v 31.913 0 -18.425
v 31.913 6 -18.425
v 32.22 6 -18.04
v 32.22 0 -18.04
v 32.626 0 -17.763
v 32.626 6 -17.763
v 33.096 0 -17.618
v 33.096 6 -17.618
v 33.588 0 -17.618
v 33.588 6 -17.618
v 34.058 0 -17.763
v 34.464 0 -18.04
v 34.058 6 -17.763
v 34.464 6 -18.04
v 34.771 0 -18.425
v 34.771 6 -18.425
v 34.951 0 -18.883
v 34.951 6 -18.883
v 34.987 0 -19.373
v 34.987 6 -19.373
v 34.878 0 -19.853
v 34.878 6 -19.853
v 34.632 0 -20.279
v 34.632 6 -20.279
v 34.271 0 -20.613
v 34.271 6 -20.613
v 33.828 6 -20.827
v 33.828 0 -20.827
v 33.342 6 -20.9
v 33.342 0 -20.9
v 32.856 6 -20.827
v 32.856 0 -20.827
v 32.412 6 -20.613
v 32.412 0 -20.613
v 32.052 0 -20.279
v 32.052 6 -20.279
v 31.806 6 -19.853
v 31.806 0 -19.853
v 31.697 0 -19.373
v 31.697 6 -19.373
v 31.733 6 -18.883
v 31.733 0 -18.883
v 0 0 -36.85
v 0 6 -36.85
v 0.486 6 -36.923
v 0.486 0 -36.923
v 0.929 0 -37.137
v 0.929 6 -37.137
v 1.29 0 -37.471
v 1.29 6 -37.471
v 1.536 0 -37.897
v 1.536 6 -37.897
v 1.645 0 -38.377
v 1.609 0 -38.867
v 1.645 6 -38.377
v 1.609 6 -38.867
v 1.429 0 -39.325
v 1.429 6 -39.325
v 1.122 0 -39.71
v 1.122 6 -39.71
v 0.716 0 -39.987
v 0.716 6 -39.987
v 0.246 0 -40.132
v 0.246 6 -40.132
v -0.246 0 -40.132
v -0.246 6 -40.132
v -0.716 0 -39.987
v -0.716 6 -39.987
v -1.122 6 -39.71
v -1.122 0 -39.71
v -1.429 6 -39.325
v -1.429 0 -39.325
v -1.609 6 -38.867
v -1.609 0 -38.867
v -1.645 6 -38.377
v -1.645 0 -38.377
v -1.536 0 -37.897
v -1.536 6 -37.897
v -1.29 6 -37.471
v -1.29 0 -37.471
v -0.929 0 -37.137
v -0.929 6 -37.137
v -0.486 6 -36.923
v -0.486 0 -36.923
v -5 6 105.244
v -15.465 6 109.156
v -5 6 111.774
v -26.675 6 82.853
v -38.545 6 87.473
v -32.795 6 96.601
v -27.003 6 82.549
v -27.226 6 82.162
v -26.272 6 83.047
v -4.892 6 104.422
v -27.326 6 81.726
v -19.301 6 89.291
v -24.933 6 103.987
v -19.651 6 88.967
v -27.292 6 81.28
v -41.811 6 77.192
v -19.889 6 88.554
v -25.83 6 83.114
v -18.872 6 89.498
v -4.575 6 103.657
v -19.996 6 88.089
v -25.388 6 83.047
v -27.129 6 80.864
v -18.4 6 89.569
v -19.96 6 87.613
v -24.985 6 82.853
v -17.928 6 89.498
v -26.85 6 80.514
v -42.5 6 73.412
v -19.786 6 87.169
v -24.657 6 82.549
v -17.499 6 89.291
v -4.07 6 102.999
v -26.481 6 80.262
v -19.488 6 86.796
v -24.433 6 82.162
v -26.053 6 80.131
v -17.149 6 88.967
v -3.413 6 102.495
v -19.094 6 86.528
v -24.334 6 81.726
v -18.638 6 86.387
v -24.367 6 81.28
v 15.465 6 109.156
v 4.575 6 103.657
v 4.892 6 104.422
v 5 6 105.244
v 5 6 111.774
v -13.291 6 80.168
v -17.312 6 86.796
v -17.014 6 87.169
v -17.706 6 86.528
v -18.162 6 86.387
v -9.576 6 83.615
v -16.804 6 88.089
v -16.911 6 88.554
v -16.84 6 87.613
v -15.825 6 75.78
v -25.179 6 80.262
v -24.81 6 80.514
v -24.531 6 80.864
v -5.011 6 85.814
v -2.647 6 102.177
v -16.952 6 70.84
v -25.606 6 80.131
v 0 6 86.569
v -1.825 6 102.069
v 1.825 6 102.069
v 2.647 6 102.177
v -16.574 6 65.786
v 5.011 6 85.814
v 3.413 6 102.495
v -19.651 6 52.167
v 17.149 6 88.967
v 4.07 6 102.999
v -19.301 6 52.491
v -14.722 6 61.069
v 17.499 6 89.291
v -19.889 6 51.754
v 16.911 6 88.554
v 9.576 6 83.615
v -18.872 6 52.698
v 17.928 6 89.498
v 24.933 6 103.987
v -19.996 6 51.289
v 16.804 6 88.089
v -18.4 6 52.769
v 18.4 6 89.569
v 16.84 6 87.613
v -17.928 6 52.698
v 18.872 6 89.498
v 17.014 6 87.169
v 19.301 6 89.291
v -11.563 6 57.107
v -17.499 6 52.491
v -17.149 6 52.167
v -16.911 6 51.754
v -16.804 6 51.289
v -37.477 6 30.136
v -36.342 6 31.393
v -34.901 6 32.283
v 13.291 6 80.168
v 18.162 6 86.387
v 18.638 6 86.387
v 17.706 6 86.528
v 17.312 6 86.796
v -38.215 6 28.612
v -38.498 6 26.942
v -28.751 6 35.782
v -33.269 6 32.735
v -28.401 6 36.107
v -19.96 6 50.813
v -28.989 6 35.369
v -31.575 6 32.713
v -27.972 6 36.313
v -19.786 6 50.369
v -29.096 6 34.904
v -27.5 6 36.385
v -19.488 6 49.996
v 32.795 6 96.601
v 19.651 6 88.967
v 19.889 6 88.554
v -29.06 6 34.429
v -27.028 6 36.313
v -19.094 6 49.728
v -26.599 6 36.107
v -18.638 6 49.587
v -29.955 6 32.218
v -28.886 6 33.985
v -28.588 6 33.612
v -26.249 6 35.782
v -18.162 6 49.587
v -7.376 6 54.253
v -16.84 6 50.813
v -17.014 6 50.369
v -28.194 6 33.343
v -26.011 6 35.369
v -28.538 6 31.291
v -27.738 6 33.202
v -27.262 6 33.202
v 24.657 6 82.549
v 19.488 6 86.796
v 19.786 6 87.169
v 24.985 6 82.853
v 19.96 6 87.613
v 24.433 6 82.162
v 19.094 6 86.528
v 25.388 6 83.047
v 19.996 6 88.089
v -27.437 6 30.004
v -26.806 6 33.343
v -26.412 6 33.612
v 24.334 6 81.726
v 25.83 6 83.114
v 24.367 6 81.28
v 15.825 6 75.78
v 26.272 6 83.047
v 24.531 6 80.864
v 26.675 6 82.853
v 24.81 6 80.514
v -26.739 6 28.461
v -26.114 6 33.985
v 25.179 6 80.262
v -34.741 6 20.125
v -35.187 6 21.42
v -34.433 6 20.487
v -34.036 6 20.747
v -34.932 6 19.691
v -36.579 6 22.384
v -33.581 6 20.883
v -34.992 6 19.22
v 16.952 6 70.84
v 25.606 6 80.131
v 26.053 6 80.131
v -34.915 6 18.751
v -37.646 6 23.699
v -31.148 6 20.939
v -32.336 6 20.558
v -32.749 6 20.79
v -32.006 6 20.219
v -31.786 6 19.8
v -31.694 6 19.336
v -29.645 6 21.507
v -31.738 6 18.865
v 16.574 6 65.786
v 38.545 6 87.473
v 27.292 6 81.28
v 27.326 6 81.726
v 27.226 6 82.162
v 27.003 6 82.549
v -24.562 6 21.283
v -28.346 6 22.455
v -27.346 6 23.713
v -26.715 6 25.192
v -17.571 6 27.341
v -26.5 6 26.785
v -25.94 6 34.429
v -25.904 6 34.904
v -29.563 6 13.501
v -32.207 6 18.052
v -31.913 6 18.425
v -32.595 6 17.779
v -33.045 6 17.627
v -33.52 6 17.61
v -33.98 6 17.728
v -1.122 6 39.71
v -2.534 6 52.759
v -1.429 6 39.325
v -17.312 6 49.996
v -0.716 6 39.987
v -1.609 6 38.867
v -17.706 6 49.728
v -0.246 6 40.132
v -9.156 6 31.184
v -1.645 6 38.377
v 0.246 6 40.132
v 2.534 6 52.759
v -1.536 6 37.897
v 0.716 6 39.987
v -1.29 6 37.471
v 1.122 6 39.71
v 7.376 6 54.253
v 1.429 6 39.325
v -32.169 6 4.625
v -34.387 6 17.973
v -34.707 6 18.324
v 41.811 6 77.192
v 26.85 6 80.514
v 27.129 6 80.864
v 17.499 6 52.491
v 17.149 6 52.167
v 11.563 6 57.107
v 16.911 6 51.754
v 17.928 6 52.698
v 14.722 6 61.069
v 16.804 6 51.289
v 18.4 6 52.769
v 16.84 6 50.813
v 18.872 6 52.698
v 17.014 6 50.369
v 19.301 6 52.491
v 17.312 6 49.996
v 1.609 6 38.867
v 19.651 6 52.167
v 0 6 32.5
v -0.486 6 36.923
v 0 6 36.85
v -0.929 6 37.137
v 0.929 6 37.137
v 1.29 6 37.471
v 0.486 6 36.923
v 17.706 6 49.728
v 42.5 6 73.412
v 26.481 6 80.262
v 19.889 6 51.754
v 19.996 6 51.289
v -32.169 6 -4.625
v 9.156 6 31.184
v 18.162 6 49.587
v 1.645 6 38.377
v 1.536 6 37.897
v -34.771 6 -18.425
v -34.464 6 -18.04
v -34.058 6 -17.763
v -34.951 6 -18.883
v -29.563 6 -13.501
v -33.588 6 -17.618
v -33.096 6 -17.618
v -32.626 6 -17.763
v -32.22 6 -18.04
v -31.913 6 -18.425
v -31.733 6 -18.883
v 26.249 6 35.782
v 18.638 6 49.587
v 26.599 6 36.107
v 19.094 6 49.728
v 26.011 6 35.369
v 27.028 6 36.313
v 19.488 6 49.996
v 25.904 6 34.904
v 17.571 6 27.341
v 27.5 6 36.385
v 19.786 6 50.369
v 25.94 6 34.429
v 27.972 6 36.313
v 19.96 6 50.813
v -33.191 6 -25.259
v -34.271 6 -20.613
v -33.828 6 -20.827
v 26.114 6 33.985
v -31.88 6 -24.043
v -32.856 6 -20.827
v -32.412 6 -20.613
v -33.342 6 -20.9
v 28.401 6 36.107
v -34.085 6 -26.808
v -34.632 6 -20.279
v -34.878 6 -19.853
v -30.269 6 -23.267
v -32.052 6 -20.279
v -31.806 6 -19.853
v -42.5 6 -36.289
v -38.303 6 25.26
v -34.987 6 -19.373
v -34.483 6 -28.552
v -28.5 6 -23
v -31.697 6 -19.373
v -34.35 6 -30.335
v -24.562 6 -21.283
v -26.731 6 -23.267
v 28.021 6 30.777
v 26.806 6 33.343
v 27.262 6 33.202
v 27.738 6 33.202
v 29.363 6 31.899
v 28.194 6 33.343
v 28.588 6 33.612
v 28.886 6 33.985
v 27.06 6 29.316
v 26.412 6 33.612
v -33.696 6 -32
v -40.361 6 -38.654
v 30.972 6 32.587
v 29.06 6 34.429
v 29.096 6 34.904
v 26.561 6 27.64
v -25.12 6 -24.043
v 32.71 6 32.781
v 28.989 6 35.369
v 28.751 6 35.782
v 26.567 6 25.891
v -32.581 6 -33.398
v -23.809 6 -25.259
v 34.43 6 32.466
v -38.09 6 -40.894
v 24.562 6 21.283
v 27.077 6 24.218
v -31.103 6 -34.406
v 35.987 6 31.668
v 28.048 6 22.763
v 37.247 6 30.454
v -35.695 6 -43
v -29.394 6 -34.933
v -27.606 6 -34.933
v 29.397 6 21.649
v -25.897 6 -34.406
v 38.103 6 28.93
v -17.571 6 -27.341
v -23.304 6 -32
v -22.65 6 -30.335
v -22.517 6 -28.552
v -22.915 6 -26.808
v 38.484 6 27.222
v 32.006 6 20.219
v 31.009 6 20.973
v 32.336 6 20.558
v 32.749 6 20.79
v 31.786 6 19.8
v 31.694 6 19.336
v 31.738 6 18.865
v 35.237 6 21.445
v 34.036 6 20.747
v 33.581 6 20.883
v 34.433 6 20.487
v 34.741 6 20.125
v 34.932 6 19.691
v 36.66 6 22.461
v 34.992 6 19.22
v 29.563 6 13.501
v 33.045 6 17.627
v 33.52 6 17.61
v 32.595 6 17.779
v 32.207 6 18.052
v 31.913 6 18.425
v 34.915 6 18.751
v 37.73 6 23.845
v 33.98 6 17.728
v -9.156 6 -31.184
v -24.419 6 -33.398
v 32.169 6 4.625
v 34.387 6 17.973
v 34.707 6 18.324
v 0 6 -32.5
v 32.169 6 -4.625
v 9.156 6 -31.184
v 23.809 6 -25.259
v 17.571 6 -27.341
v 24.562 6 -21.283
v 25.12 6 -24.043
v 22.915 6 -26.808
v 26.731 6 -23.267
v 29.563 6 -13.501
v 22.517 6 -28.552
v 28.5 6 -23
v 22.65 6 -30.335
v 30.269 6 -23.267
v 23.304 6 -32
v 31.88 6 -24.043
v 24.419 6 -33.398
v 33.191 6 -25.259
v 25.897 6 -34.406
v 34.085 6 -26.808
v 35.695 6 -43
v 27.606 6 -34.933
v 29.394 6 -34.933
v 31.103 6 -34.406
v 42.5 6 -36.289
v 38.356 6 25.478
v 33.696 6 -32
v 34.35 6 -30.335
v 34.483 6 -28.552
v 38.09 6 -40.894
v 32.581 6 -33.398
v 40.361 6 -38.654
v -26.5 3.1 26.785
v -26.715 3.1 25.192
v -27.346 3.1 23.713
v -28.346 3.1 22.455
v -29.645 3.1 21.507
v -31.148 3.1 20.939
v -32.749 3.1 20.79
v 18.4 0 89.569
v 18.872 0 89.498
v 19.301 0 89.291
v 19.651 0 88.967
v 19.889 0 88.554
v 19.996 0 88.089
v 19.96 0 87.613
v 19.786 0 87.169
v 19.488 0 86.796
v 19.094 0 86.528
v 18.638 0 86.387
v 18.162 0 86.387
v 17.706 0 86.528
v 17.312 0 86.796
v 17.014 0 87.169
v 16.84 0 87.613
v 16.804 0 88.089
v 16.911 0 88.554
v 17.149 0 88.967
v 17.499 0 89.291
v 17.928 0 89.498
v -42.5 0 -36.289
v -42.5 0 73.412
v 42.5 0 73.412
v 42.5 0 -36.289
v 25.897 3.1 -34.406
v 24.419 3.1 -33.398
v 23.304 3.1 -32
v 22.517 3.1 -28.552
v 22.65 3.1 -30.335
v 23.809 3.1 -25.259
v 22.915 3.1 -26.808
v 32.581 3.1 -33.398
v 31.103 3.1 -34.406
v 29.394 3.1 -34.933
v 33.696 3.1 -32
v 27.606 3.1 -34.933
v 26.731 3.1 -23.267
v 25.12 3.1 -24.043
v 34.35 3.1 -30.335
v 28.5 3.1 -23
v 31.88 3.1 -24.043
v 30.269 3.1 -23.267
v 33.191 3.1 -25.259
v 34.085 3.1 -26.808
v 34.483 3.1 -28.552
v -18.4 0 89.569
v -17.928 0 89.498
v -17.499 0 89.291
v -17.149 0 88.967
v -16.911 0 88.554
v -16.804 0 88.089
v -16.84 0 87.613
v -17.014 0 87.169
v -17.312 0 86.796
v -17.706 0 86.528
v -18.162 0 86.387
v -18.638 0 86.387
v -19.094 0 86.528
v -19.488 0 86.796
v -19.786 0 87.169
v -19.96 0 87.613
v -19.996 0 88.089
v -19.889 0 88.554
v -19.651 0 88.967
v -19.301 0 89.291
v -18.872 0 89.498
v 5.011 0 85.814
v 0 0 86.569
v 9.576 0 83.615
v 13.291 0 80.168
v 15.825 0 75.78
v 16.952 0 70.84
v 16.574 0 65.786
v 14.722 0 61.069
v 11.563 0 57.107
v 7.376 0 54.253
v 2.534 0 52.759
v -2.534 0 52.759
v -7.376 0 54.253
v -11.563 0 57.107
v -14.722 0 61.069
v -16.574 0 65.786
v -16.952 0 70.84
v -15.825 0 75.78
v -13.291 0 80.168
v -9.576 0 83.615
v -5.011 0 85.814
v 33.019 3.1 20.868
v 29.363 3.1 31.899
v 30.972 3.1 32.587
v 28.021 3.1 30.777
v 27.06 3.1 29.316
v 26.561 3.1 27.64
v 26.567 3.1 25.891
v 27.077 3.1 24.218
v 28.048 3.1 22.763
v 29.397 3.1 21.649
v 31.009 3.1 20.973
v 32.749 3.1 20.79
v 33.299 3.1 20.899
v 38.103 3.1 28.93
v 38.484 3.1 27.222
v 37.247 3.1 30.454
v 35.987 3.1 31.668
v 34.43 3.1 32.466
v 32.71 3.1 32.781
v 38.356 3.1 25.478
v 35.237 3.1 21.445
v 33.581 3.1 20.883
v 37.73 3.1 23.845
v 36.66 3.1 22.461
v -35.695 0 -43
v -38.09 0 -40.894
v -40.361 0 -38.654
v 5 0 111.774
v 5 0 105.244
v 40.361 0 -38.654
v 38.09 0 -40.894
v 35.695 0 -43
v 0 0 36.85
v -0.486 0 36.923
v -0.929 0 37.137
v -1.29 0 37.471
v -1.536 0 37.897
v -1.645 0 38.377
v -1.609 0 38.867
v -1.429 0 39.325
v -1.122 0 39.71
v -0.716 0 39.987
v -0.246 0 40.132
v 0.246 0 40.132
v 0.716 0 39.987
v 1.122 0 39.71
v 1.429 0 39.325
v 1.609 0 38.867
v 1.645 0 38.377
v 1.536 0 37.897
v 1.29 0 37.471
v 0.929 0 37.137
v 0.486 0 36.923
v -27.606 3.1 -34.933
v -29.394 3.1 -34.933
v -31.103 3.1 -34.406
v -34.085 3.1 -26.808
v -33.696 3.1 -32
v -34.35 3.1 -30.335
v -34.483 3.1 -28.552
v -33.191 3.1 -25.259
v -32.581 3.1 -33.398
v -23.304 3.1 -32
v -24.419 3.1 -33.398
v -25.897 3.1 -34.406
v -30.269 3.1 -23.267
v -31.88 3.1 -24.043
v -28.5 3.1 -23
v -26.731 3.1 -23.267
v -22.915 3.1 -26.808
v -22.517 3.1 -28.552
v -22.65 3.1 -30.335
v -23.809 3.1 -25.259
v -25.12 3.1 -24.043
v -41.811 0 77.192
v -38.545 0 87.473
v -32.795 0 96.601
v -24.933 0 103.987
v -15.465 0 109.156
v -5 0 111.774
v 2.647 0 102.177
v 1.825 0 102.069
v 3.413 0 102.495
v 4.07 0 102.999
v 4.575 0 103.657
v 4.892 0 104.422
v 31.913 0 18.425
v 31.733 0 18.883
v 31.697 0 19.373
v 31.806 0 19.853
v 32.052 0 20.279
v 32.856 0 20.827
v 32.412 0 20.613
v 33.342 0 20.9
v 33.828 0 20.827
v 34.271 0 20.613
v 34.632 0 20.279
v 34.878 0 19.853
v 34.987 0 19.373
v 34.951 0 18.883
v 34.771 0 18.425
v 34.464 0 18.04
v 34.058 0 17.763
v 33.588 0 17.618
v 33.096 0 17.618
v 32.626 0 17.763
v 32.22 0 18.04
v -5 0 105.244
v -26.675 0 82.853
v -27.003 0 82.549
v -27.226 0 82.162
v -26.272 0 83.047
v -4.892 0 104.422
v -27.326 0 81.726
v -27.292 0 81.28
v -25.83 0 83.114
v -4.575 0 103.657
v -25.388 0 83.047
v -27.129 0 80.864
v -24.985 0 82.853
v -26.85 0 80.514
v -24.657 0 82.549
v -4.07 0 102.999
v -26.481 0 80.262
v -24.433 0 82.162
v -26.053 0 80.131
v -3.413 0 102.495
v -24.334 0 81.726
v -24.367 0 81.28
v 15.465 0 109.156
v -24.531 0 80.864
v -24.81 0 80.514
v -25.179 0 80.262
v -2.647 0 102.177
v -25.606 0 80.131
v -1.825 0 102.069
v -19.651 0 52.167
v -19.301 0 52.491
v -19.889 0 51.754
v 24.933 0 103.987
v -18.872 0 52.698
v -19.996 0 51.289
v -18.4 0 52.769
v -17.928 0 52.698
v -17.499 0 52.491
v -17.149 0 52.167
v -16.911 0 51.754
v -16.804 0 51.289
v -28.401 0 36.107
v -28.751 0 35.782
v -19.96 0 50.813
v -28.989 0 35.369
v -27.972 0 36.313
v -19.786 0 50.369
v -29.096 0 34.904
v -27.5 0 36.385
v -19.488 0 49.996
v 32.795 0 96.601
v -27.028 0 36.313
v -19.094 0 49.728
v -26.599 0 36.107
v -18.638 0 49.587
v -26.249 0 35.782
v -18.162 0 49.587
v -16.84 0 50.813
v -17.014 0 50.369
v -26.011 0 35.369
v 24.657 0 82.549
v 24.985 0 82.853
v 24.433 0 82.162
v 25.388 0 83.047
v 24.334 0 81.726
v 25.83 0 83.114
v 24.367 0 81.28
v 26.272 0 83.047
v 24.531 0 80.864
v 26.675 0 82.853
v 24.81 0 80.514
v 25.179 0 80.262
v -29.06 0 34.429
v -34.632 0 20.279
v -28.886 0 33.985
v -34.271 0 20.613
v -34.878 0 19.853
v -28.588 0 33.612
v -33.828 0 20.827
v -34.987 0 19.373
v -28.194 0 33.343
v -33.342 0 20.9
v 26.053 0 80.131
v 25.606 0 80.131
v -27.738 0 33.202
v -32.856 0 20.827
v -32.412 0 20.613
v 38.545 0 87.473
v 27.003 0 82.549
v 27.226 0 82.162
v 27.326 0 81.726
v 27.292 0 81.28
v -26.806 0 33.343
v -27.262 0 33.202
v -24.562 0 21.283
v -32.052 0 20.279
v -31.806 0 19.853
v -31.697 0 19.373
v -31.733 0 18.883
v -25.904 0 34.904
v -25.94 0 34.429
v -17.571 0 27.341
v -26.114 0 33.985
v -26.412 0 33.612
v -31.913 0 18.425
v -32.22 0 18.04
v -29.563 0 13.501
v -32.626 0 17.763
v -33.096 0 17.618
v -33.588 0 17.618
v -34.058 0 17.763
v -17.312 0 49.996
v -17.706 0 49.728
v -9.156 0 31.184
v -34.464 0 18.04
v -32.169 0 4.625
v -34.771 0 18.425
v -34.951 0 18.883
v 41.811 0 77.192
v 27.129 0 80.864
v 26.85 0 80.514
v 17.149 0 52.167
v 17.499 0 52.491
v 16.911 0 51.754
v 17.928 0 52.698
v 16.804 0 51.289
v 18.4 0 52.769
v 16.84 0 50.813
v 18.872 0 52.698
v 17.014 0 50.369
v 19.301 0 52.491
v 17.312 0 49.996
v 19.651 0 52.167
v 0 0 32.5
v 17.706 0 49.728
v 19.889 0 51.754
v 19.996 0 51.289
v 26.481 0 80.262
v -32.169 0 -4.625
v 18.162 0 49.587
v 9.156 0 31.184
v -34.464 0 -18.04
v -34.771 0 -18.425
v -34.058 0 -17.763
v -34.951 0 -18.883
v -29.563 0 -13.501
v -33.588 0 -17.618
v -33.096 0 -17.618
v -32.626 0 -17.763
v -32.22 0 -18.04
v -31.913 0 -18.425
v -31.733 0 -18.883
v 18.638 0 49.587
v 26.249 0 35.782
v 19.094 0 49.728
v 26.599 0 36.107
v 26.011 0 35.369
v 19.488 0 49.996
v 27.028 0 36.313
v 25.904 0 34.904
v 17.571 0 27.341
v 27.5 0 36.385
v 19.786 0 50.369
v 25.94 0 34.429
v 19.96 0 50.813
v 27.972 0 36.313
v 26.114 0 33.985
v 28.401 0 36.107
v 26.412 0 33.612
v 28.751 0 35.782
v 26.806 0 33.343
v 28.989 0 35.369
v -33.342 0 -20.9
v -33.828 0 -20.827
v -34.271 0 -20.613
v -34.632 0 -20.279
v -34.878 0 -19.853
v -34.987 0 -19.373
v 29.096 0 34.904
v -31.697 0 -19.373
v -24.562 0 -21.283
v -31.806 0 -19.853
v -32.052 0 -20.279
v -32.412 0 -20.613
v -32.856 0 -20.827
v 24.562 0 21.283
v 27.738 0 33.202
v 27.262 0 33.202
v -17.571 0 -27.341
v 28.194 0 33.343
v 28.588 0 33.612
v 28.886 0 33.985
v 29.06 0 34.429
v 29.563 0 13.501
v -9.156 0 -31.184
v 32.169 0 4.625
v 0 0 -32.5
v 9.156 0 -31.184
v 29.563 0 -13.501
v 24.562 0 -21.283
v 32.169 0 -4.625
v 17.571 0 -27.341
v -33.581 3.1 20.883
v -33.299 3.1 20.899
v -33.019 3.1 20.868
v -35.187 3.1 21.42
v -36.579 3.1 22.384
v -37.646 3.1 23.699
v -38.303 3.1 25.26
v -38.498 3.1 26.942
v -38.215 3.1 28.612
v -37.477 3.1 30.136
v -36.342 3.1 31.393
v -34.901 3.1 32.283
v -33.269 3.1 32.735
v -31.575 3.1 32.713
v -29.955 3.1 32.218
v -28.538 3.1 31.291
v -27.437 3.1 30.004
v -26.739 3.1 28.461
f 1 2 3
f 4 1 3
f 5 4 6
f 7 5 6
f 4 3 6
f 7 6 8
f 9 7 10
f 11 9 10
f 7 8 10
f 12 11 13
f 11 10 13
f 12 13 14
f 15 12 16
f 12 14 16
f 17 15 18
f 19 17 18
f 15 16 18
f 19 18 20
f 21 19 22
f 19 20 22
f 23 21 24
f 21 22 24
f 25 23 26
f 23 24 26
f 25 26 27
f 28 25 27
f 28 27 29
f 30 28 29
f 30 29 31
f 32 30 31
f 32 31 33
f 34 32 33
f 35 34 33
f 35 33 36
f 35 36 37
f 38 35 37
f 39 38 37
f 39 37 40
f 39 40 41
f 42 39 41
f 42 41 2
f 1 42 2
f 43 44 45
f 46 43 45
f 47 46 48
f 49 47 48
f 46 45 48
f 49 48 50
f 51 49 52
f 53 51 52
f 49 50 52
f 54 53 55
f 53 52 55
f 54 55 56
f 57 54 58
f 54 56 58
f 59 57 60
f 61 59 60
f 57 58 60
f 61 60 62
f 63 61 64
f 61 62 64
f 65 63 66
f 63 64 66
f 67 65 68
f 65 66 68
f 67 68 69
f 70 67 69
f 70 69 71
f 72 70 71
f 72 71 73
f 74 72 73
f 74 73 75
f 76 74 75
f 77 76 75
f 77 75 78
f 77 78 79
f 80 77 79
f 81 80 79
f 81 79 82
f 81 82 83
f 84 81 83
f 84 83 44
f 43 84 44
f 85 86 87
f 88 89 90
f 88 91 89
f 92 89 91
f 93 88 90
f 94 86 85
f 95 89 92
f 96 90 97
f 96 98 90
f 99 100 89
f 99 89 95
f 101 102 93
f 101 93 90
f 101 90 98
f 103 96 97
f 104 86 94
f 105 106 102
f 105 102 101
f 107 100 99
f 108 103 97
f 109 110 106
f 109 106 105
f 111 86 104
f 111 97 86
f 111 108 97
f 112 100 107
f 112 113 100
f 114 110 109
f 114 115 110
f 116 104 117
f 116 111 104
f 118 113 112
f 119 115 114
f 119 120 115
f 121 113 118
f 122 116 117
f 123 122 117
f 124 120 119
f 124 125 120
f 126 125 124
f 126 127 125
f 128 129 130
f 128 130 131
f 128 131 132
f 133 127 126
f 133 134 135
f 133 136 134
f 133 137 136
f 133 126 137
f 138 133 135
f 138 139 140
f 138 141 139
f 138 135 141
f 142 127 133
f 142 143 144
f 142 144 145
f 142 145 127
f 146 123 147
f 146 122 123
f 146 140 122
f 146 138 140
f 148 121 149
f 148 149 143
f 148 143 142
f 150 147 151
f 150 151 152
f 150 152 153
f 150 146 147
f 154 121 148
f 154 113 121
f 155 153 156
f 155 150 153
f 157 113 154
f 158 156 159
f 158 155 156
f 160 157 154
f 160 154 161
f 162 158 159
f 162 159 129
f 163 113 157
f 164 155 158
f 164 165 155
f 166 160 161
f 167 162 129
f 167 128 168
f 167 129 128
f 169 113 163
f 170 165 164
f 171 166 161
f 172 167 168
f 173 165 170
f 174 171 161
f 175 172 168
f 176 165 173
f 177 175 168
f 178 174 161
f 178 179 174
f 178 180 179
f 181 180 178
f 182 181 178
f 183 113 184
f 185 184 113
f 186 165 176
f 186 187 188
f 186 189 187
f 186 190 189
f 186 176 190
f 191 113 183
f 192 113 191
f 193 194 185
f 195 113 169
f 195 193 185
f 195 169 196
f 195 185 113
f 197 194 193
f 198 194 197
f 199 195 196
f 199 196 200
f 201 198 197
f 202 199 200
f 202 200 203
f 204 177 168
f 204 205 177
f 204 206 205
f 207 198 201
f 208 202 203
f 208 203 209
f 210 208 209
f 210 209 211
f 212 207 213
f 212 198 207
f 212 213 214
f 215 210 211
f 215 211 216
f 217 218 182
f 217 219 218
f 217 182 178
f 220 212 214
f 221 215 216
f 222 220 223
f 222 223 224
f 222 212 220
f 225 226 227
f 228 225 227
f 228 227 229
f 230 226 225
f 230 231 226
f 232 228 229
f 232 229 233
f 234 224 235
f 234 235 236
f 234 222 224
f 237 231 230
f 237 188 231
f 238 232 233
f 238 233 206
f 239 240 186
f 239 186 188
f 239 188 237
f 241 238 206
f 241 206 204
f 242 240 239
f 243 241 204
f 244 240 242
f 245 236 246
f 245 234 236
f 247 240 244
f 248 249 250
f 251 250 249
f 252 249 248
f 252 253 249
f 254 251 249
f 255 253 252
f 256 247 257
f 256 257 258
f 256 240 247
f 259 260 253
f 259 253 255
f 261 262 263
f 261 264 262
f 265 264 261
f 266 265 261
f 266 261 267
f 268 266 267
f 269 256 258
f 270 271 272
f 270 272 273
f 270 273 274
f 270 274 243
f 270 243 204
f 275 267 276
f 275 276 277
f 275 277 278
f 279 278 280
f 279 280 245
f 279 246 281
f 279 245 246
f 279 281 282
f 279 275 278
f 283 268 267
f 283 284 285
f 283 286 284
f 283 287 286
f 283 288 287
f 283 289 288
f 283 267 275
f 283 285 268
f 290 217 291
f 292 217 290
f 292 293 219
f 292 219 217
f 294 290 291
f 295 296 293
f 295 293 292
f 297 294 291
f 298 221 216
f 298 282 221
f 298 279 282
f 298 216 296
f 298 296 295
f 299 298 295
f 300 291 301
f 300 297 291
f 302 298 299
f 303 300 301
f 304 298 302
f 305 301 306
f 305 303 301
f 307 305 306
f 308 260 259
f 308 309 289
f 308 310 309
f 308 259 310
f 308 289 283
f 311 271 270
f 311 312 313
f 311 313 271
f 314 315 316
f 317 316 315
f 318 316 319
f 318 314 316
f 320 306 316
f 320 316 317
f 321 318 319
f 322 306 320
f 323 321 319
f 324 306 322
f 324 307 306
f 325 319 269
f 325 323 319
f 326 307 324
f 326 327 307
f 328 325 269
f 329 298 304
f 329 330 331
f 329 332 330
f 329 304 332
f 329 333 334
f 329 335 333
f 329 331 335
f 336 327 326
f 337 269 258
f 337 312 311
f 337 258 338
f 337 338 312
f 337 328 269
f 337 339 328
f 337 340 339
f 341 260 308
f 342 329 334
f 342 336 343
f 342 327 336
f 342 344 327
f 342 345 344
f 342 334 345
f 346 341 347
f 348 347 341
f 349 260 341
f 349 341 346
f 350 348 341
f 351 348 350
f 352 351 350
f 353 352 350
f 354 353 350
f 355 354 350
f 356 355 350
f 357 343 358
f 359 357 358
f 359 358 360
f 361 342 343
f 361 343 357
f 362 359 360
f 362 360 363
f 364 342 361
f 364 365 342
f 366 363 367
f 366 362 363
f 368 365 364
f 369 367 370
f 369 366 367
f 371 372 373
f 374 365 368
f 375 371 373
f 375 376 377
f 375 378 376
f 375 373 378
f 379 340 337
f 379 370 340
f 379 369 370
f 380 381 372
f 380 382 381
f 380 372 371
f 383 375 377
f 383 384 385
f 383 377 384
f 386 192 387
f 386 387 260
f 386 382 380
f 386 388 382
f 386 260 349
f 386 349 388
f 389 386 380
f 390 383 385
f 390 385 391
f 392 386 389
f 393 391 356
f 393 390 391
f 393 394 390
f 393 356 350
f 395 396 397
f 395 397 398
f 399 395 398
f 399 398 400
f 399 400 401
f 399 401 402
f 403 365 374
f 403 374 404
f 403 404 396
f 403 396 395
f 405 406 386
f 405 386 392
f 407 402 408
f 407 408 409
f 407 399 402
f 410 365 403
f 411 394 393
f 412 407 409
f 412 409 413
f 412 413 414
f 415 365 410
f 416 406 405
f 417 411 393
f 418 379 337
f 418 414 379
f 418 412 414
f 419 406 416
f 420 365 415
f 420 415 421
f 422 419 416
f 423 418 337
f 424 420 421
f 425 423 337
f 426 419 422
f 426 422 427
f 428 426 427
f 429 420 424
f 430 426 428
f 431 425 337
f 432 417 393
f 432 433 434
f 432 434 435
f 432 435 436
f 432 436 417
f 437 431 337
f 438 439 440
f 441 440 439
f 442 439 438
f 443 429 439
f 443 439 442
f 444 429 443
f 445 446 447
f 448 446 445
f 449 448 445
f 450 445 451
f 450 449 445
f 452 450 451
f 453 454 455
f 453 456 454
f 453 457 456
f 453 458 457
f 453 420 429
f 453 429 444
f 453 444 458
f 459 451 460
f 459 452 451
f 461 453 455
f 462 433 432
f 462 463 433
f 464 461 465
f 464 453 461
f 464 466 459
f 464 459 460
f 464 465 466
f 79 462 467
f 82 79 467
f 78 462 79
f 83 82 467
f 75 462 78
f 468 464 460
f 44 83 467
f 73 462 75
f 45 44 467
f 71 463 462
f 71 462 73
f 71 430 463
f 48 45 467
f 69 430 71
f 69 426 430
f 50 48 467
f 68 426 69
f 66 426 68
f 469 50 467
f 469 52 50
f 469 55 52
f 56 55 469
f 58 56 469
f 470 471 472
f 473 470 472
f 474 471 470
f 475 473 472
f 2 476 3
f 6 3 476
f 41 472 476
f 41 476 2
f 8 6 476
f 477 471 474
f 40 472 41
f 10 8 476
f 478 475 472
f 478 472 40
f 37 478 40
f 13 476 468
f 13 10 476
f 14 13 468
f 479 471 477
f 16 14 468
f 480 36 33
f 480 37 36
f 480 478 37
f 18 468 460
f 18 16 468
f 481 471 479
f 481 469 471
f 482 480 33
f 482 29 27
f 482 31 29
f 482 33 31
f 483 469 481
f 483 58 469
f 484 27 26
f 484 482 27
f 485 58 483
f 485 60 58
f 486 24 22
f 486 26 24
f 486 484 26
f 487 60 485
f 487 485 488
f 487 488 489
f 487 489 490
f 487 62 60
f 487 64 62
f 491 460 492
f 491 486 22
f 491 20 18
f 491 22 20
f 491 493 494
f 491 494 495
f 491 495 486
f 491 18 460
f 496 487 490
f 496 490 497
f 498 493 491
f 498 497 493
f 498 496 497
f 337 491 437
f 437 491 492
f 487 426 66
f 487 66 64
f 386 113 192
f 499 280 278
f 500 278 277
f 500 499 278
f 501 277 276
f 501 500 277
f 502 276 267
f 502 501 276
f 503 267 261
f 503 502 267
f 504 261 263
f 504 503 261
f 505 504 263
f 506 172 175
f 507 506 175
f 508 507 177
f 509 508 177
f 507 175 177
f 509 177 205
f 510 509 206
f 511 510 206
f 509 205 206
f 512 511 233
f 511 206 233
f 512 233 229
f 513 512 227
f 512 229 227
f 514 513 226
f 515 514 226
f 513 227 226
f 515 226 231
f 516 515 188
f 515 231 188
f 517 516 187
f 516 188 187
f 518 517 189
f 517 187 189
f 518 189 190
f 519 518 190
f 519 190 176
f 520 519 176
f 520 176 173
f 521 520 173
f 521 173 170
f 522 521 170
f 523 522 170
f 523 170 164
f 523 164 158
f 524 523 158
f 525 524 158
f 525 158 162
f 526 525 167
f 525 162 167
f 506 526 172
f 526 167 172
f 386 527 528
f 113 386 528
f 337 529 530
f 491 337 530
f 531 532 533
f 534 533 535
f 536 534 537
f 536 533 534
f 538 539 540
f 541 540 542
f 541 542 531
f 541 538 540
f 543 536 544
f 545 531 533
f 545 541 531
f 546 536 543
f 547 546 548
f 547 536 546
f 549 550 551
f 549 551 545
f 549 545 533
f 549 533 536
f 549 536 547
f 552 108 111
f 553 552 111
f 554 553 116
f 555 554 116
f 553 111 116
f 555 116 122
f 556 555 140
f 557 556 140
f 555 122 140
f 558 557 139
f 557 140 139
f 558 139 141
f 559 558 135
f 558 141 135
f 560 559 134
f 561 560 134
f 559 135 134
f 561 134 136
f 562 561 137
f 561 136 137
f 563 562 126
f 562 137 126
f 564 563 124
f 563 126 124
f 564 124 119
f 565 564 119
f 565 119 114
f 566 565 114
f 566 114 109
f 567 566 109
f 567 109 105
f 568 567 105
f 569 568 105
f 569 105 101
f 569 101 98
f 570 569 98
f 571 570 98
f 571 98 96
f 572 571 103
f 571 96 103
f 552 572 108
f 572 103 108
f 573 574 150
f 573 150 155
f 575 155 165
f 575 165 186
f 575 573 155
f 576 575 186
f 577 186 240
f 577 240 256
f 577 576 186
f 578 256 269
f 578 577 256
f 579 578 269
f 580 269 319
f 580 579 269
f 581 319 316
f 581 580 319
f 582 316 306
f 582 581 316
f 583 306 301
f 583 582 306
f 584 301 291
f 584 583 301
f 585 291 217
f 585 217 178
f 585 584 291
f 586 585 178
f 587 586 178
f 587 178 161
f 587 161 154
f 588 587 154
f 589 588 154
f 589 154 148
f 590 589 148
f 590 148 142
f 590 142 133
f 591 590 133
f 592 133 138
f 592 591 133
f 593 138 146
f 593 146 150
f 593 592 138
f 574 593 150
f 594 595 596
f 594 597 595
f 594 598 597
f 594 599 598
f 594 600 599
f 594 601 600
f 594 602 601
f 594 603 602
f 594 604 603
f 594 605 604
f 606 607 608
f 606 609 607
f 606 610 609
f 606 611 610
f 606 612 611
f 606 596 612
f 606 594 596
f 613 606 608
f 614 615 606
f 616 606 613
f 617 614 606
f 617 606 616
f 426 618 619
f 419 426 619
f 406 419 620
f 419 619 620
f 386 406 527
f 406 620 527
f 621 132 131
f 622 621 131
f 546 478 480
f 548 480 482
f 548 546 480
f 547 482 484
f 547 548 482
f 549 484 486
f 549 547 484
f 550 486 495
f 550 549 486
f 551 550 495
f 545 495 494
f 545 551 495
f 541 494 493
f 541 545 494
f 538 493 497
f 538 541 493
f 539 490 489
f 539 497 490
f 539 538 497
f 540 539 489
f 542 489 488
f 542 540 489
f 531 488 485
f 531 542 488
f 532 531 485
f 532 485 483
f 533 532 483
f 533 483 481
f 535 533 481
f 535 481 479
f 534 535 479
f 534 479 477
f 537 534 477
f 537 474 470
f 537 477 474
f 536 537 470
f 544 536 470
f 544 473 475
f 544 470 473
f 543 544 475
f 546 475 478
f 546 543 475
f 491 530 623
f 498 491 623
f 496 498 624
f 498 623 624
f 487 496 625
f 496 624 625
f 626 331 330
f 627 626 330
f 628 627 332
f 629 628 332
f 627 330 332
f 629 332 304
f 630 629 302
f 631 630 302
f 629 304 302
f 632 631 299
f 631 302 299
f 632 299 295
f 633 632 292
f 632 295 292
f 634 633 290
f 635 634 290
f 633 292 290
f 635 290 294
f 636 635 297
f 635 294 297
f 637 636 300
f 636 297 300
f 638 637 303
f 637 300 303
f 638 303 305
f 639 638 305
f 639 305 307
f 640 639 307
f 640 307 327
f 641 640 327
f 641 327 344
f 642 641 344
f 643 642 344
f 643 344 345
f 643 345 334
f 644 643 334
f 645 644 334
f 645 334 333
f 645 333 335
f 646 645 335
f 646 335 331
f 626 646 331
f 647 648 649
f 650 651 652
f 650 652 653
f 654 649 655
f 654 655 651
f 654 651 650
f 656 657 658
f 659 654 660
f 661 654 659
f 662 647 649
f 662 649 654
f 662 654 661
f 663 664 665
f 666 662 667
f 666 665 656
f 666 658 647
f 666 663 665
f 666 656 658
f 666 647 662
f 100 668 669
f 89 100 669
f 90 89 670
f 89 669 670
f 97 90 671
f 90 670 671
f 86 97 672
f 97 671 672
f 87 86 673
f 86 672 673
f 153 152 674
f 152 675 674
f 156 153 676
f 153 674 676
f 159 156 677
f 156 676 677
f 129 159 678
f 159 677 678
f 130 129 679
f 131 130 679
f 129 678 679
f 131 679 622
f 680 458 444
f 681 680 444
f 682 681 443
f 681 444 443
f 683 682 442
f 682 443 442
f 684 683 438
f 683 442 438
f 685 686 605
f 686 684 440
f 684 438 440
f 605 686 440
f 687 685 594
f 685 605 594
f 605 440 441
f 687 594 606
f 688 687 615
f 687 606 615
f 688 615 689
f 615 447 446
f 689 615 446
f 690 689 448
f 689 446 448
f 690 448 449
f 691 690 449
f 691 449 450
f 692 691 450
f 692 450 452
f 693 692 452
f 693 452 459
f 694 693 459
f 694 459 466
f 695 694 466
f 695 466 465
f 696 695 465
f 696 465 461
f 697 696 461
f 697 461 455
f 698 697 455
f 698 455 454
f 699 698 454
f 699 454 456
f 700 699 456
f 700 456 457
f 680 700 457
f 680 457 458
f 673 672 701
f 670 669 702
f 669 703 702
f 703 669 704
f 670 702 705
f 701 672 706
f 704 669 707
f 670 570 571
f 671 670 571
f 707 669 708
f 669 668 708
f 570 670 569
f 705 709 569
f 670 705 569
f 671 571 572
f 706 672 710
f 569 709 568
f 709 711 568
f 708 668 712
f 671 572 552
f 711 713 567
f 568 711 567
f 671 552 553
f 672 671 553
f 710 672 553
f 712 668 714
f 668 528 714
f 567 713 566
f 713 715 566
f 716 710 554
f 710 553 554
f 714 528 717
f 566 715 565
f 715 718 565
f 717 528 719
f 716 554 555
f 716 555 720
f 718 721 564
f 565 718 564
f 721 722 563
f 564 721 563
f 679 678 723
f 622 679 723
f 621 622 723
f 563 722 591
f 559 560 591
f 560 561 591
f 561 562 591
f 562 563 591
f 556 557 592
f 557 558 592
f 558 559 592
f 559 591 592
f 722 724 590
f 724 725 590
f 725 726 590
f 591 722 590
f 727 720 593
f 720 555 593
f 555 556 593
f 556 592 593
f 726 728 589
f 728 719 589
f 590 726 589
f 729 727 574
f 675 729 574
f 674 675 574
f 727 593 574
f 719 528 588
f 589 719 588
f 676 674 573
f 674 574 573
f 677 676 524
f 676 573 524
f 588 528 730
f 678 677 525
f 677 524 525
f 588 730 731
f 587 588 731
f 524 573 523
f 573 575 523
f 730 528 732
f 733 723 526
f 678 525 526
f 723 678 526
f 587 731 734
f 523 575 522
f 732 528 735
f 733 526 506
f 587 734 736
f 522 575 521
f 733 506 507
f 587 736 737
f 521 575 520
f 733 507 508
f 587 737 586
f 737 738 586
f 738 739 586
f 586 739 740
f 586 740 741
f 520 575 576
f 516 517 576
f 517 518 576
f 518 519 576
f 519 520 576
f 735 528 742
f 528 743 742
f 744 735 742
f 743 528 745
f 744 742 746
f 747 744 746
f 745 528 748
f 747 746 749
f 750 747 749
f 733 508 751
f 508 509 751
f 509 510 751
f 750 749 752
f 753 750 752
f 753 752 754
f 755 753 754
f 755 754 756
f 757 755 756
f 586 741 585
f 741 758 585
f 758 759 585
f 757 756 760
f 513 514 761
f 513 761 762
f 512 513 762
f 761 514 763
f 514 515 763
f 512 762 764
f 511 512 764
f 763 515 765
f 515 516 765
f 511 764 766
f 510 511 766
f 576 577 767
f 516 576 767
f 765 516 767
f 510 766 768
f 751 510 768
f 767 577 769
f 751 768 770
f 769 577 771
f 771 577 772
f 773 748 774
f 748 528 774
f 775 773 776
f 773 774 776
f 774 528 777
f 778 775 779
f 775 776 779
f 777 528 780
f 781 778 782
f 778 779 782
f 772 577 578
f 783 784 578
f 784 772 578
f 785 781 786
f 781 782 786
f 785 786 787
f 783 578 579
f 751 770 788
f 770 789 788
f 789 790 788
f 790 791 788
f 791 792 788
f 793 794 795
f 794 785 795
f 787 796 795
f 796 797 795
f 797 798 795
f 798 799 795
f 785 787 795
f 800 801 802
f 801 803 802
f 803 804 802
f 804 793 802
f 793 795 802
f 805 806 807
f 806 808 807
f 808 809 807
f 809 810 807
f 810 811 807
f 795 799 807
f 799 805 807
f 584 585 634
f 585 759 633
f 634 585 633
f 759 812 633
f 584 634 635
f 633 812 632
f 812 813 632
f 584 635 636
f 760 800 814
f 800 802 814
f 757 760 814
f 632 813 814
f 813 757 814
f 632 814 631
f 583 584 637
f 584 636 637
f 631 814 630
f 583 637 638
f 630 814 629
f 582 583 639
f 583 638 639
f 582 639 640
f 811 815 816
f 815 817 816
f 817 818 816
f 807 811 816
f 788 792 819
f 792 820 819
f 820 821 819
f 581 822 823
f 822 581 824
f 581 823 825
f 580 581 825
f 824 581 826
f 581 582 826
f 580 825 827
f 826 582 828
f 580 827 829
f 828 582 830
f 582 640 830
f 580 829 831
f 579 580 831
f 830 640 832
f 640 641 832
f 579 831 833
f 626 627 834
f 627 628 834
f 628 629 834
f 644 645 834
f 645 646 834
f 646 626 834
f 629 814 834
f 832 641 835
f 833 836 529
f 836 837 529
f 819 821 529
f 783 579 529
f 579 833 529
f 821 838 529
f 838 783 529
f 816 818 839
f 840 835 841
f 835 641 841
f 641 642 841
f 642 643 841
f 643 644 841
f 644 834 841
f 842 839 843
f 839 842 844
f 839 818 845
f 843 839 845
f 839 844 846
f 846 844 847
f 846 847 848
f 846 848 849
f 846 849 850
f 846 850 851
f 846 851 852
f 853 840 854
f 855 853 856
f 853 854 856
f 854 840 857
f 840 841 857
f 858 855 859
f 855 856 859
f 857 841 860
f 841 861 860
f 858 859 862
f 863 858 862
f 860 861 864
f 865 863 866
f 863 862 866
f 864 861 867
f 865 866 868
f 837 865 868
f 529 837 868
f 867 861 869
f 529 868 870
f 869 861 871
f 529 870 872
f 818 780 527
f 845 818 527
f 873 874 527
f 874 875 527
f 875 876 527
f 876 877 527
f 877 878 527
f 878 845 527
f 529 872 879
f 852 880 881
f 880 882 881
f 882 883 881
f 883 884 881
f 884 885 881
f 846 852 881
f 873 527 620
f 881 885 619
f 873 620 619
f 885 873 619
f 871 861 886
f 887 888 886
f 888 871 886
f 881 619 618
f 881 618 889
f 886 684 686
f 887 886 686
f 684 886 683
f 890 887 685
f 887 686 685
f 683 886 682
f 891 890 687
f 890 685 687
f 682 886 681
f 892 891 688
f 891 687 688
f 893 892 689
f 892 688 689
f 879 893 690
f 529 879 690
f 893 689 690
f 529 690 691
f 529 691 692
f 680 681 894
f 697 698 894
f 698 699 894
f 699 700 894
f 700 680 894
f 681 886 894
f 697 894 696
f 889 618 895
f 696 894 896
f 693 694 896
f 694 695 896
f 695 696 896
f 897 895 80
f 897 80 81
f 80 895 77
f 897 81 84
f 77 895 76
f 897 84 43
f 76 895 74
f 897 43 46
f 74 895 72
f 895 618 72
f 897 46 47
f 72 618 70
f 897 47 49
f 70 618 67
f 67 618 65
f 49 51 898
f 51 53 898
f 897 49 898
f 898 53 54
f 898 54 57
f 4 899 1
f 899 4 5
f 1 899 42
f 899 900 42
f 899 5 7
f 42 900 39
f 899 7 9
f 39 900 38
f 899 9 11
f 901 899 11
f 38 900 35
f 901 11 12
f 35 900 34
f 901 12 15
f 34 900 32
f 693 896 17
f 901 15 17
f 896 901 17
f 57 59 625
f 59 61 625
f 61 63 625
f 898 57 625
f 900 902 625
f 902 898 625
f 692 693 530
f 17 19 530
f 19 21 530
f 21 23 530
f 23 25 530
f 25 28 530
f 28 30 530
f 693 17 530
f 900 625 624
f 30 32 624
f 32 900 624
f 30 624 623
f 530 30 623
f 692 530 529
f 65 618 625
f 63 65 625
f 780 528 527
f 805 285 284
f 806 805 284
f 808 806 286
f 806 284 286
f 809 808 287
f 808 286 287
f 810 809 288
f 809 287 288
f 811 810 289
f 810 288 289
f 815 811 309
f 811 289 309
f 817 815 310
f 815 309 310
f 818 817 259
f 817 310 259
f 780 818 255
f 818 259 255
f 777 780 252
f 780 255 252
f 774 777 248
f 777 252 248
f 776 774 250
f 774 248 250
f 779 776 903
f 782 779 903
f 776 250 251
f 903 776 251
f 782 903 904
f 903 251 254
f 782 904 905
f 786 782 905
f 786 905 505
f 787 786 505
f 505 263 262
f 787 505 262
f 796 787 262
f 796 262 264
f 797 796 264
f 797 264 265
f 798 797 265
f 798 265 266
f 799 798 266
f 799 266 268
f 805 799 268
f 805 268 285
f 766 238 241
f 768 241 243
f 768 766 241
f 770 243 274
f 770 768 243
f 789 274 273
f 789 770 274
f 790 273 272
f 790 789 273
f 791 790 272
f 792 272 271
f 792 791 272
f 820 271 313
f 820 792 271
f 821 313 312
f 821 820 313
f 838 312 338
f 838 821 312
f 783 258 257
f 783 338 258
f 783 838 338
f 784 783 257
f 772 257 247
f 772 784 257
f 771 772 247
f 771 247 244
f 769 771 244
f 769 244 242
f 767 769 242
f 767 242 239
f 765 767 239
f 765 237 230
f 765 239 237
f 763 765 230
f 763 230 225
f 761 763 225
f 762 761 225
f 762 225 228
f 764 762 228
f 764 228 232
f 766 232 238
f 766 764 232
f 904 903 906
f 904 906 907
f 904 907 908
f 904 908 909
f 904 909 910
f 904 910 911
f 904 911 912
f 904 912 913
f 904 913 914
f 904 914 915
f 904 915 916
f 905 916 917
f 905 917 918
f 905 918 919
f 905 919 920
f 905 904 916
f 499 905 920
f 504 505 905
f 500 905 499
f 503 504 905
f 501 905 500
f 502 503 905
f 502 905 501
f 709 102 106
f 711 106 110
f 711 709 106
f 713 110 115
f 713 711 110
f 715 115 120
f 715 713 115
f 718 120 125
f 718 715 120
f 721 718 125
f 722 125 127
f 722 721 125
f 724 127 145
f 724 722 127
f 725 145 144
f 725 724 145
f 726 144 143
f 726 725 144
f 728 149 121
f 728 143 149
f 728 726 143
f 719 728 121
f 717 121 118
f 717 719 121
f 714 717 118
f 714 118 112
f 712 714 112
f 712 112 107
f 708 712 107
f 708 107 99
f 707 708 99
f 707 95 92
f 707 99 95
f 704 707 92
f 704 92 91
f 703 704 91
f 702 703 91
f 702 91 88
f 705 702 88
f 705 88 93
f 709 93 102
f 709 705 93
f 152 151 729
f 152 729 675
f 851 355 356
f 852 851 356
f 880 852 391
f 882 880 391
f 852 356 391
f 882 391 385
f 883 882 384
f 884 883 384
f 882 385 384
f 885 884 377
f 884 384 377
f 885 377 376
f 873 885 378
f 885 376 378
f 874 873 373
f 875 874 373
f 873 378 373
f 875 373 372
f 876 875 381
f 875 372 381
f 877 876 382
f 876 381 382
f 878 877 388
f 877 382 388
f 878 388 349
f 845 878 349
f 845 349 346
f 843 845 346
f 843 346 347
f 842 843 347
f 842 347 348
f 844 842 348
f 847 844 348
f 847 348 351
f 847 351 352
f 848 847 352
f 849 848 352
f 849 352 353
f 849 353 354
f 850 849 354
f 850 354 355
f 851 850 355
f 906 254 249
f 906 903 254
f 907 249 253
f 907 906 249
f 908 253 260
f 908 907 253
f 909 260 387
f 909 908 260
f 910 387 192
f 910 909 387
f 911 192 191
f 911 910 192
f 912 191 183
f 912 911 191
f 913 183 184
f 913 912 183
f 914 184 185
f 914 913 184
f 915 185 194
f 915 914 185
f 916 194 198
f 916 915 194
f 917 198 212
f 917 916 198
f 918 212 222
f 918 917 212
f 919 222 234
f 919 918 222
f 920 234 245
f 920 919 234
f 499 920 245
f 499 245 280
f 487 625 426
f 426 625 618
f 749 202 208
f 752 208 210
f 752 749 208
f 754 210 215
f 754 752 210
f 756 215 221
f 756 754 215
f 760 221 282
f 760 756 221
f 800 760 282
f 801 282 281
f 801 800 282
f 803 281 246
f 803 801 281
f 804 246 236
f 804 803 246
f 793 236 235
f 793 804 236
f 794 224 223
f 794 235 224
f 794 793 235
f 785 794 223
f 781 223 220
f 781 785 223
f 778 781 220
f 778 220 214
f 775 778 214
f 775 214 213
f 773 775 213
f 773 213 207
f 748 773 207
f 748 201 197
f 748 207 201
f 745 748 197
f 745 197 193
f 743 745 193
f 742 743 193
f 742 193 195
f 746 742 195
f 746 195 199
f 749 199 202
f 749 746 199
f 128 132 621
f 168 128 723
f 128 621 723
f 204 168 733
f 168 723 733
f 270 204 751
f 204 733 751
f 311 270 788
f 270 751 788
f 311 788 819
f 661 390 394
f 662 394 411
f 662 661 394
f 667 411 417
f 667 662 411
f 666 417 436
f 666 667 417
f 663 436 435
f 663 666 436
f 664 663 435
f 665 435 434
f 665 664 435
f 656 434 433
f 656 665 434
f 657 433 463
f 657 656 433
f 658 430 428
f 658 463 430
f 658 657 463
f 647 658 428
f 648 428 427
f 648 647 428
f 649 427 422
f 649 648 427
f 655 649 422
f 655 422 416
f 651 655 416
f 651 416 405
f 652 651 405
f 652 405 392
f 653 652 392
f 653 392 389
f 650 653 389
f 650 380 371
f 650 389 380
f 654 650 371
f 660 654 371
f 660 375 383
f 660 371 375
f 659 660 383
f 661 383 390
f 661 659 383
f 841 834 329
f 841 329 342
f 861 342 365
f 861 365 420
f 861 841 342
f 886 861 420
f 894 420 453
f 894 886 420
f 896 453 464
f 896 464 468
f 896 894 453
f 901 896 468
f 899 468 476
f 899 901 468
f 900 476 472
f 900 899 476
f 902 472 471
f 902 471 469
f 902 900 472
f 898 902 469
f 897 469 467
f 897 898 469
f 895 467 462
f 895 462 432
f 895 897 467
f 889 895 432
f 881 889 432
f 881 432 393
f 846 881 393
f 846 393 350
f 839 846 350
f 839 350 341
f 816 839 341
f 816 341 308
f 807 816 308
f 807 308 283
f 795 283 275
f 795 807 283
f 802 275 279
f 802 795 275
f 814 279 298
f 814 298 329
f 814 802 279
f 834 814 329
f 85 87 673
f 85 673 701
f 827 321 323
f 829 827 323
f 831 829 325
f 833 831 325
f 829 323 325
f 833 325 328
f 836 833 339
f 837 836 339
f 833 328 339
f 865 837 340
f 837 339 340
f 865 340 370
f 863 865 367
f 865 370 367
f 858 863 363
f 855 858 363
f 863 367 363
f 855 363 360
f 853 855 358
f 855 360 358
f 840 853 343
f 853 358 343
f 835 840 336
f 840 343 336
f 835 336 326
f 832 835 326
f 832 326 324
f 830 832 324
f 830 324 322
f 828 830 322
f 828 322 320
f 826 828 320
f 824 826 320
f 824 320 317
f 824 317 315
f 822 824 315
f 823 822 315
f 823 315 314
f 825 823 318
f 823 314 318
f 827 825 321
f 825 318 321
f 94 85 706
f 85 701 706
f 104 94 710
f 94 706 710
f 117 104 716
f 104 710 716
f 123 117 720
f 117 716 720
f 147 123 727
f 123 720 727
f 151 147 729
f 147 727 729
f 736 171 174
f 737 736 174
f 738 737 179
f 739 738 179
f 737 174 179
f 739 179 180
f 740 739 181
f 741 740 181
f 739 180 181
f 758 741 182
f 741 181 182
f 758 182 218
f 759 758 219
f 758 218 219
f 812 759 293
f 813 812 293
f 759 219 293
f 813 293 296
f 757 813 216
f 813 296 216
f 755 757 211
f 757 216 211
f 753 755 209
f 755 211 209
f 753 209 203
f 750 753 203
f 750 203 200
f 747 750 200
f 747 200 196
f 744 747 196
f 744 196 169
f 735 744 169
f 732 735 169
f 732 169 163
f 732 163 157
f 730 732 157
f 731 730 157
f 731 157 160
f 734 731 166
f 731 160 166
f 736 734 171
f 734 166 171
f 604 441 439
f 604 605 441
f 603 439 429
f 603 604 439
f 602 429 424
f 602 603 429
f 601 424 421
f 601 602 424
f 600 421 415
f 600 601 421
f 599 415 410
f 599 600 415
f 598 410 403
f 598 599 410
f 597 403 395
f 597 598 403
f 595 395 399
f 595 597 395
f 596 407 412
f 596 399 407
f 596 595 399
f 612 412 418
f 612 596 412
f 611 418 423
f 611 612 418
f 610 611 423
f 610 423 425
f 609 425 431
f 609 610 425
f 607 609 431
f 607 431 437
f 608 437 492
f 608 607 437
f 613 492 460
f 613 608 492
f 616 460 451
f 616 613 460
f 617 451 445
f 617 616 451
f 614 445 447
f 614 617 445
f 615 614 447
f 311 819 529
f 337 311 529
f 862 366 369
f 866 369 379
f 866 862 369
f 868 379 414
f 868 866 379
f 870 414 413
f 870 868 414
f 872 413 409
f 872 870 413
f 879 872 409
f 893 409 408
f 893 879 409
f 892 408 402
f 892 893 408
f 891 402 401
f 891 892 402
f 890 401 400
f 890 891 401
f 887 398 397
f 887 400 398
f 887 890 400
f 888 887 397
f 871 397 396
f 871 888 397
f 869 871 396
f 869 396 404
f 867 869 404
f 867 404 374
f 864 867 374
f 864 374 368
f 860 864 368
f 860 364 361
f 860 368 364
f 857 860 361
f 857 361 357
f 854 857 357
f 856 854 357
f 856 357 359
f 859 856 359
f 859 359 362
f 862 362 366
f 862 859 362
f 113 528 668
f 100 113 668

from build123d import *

# Parameters (mm, degrees)
SKETCH1_R            = 32.5
SKETCH1_R_2          = 17
BOSS_EXTRUDE1_DEPTH  = 6
SKETCH2_R            = 1.6
CUT_EXTRUDE1_DEPTH   = 6
LPATTERN1_COUNT      = 2
LPATTERN1_PITCH      = 36.8
LPATTERN1_COUNT_DIR2 = 2
LPATTERN1_PITCH_DIR2 = 36.8
SKETCH3_R            = 1.65
CUT_EXTRUDE2_DEPTH   = 10
CIRPATTERN1_COUNT    = 6
SKETCH6_W            = 10
SKETCH6_H            = 20
CUT_EXTRUDE4_DEPTH   = 10
SKETCH7_R            = 1.6
SKETCH7_R_2          = 1.5
CUT_EXTRUDE5_DEPTH   = 20
FILLET1_R            = 3.175
CUT_EXTRUDE6_START   = 3.1
SKETCH8_R            = 6
CUT_EXTRUDE6_DEPTH   = 20


with BuildPart() as part:
    # Sketch1 → Boss-Extrude1 (new body)
    with BuildSketch(Plane(origin=(0, 0, 0), x_dir=(1, 0, 0), z_dir=(0, 1, 0))):
        with BuildLine():
            Line((-42.5, -73.411966665), (-41.810700901, -77.192472856))
            ThreePointArc((-41.810700901, -77.192472856), (0, -112.069134335), (41.810700901, -77.192472856))
            Line((41.810700901, -77.192472856), (42.5, -73.411966665))
            Line((42.5, -73.411966665), (42.5, 36.289181897))
            ThreePointArc((42.5, 36.289181897), (39.241370505, 39.790319974), (35.695303931, 43))
            Line((35.695303931, 43), (-35.695303931, 43))
            ThreePointArc((-35.695303931, 43), (-39.241370505, 39.790319974), (-42.5, 36.289181897))
            Line((-42.5, 36.289181897), (-42.5, -73.411966665))
        make_face()
        with Locations(Location((0, 0, 0), (0, 0, 270))):
            Circle(SKETCH1_R, mode=Mode.SUBTRACT)
        with Locations(Location((0, -69.569134335, 0), (0, 0, 270))):
            Circle(SKETCH1_R_2, mode=Mode.SUBTRACT)
    extrude(amount=BOSS_EXTRUDE1_DEPTH)

    # Sketch2 → Cut-Extrude1 (cut)
    with BuildSketch(Plane(origin=(0, 6, 0), x_dir=(1, 0, 0), z_dir=(0, 1, 0))):
        with Locations(Location((18.4, -51.169134335, 0), (0, 0, 270))):
            Circle(SKETCH2_R)
    cut_extrude1 = extrude(amount=-CUT_EXTRUDE1_DEPTH, mode=Mode.SUBTRACT)

    # LPattern1: Cut-Extrude1 2 × 2
    with Locations(*[(-j * LPATTERN1_PITCH_DIR2, 0, i * LPATTERN1_PITCH) for i in range(LPATTERN1_COUNT) for j in range(LPATTERN1_COUNT_DIR2) if (i, j) != (0, 0)]):
        add(cut_extrude1, mode=Mode.SUBTRACT)

    # Sketch3 → Cut-Extrude2 (cut)
    with BuildSketch(Plane(origin=(0, 6, 0), x_dir=(1, 0, 0), z_dir=(0, 1, 0))):
        with Locations(Location((0, 38.5, 0), (0, 0, 270))):
            Circle(SKETCH3_R)
    cut_extrude2 = extrude(amount=-CUT_EXTRUDE2_DEPTH, mode=Mode.SUBTRACT)

    # CirPattern1: Cut-Extrude2 ×6 about axis
    cirpattern1_axis = Axis((0, 0, 0), (0, 1, 0))
    for i in range(1, CIRPATTERN1_COUNT):
        add(cut_extrude2.rotate(cirpattern1_axis, i * 360 / CIRPATTERN1_COUNT), mode=Mode.SUBTRACT)

    # Sketch6 → Cut-Extrude4 (cut)
    with BuildSketch(Plane(origin=(0, 6, 0), x_dir=(1, 0, 0), z_dir=(0, 1, 0))):
        with Locations((0, -112.069134335)):
            Rectangle(SKETCH6_W, SKETCH6_H)
    extrude(amount=-CUT_EXTRUDE4_DEPTH, mode=Mode.SUBTRACT)

    # Sketch7 → Cut-Extrude5 (cut)
    with BuildSketch(Plane(origin=(0, 0, 0), x_dir=(1, 0, 0), z_dir=(0, 1, 0))):
        with Locations(Location((-27.5, -34.784567168, 0), (0, 0, 270))):
            Circle(SKETCH7_R)
        with Locations(Location((-25.829771931, -81.613754795, 0), (0, 0, 270))):
            Circle(SKETCH7_R_2)
        with Locations(Location((25.829771931, -81.613754795, 0), (0, 0, 270))):
            Circle(SKETCH7_R_2)
        with Locations(Location((27.5, -34.784567168, 0), (0, 0, 270))):
            Circle(SKETCH7_R)
    extrude(amount=CUT_EXTRUDE5_DEPTH, mode=Mode.SUBTRACT)

    # Fillet1
    fillet1_edges = [part.edges().sort_by_distance(p)[0] for p in [
        (-5, 3, 102.069134335),
        (5, 3, 102.069134335),
    ]]
    fillet(fillet1_edges, radius=FILLET1_R)

    # Sketch8 → Cut-Extrude6 (cut)
    with BuildSketch(Plane(origin=(0, 0, 0), x_dir=(1, 0, 0), z_dir=(0, 1, 0)).offset(CUT_EXTRUDE6_START)):
        with Locations(Location((-28.5, 29, 0), (0, 0, 270))):
            Circle(SKETCH8_R)
        with Locations((-32.5, -26.784567168)):
            Circle(SKETCH8_R)
        with Locations((32.5, -26.784567168)):
            Circle(SKETCH8_R)
        with Locations(Location((28.5, 29, 0), (0, 0, 270))):
            Circle(SKETCH8_R)
    extrude(amount=CUT_EXTRUDE6_DEPTH, mode=Mode.SUBTRACT)


solid = part.part
